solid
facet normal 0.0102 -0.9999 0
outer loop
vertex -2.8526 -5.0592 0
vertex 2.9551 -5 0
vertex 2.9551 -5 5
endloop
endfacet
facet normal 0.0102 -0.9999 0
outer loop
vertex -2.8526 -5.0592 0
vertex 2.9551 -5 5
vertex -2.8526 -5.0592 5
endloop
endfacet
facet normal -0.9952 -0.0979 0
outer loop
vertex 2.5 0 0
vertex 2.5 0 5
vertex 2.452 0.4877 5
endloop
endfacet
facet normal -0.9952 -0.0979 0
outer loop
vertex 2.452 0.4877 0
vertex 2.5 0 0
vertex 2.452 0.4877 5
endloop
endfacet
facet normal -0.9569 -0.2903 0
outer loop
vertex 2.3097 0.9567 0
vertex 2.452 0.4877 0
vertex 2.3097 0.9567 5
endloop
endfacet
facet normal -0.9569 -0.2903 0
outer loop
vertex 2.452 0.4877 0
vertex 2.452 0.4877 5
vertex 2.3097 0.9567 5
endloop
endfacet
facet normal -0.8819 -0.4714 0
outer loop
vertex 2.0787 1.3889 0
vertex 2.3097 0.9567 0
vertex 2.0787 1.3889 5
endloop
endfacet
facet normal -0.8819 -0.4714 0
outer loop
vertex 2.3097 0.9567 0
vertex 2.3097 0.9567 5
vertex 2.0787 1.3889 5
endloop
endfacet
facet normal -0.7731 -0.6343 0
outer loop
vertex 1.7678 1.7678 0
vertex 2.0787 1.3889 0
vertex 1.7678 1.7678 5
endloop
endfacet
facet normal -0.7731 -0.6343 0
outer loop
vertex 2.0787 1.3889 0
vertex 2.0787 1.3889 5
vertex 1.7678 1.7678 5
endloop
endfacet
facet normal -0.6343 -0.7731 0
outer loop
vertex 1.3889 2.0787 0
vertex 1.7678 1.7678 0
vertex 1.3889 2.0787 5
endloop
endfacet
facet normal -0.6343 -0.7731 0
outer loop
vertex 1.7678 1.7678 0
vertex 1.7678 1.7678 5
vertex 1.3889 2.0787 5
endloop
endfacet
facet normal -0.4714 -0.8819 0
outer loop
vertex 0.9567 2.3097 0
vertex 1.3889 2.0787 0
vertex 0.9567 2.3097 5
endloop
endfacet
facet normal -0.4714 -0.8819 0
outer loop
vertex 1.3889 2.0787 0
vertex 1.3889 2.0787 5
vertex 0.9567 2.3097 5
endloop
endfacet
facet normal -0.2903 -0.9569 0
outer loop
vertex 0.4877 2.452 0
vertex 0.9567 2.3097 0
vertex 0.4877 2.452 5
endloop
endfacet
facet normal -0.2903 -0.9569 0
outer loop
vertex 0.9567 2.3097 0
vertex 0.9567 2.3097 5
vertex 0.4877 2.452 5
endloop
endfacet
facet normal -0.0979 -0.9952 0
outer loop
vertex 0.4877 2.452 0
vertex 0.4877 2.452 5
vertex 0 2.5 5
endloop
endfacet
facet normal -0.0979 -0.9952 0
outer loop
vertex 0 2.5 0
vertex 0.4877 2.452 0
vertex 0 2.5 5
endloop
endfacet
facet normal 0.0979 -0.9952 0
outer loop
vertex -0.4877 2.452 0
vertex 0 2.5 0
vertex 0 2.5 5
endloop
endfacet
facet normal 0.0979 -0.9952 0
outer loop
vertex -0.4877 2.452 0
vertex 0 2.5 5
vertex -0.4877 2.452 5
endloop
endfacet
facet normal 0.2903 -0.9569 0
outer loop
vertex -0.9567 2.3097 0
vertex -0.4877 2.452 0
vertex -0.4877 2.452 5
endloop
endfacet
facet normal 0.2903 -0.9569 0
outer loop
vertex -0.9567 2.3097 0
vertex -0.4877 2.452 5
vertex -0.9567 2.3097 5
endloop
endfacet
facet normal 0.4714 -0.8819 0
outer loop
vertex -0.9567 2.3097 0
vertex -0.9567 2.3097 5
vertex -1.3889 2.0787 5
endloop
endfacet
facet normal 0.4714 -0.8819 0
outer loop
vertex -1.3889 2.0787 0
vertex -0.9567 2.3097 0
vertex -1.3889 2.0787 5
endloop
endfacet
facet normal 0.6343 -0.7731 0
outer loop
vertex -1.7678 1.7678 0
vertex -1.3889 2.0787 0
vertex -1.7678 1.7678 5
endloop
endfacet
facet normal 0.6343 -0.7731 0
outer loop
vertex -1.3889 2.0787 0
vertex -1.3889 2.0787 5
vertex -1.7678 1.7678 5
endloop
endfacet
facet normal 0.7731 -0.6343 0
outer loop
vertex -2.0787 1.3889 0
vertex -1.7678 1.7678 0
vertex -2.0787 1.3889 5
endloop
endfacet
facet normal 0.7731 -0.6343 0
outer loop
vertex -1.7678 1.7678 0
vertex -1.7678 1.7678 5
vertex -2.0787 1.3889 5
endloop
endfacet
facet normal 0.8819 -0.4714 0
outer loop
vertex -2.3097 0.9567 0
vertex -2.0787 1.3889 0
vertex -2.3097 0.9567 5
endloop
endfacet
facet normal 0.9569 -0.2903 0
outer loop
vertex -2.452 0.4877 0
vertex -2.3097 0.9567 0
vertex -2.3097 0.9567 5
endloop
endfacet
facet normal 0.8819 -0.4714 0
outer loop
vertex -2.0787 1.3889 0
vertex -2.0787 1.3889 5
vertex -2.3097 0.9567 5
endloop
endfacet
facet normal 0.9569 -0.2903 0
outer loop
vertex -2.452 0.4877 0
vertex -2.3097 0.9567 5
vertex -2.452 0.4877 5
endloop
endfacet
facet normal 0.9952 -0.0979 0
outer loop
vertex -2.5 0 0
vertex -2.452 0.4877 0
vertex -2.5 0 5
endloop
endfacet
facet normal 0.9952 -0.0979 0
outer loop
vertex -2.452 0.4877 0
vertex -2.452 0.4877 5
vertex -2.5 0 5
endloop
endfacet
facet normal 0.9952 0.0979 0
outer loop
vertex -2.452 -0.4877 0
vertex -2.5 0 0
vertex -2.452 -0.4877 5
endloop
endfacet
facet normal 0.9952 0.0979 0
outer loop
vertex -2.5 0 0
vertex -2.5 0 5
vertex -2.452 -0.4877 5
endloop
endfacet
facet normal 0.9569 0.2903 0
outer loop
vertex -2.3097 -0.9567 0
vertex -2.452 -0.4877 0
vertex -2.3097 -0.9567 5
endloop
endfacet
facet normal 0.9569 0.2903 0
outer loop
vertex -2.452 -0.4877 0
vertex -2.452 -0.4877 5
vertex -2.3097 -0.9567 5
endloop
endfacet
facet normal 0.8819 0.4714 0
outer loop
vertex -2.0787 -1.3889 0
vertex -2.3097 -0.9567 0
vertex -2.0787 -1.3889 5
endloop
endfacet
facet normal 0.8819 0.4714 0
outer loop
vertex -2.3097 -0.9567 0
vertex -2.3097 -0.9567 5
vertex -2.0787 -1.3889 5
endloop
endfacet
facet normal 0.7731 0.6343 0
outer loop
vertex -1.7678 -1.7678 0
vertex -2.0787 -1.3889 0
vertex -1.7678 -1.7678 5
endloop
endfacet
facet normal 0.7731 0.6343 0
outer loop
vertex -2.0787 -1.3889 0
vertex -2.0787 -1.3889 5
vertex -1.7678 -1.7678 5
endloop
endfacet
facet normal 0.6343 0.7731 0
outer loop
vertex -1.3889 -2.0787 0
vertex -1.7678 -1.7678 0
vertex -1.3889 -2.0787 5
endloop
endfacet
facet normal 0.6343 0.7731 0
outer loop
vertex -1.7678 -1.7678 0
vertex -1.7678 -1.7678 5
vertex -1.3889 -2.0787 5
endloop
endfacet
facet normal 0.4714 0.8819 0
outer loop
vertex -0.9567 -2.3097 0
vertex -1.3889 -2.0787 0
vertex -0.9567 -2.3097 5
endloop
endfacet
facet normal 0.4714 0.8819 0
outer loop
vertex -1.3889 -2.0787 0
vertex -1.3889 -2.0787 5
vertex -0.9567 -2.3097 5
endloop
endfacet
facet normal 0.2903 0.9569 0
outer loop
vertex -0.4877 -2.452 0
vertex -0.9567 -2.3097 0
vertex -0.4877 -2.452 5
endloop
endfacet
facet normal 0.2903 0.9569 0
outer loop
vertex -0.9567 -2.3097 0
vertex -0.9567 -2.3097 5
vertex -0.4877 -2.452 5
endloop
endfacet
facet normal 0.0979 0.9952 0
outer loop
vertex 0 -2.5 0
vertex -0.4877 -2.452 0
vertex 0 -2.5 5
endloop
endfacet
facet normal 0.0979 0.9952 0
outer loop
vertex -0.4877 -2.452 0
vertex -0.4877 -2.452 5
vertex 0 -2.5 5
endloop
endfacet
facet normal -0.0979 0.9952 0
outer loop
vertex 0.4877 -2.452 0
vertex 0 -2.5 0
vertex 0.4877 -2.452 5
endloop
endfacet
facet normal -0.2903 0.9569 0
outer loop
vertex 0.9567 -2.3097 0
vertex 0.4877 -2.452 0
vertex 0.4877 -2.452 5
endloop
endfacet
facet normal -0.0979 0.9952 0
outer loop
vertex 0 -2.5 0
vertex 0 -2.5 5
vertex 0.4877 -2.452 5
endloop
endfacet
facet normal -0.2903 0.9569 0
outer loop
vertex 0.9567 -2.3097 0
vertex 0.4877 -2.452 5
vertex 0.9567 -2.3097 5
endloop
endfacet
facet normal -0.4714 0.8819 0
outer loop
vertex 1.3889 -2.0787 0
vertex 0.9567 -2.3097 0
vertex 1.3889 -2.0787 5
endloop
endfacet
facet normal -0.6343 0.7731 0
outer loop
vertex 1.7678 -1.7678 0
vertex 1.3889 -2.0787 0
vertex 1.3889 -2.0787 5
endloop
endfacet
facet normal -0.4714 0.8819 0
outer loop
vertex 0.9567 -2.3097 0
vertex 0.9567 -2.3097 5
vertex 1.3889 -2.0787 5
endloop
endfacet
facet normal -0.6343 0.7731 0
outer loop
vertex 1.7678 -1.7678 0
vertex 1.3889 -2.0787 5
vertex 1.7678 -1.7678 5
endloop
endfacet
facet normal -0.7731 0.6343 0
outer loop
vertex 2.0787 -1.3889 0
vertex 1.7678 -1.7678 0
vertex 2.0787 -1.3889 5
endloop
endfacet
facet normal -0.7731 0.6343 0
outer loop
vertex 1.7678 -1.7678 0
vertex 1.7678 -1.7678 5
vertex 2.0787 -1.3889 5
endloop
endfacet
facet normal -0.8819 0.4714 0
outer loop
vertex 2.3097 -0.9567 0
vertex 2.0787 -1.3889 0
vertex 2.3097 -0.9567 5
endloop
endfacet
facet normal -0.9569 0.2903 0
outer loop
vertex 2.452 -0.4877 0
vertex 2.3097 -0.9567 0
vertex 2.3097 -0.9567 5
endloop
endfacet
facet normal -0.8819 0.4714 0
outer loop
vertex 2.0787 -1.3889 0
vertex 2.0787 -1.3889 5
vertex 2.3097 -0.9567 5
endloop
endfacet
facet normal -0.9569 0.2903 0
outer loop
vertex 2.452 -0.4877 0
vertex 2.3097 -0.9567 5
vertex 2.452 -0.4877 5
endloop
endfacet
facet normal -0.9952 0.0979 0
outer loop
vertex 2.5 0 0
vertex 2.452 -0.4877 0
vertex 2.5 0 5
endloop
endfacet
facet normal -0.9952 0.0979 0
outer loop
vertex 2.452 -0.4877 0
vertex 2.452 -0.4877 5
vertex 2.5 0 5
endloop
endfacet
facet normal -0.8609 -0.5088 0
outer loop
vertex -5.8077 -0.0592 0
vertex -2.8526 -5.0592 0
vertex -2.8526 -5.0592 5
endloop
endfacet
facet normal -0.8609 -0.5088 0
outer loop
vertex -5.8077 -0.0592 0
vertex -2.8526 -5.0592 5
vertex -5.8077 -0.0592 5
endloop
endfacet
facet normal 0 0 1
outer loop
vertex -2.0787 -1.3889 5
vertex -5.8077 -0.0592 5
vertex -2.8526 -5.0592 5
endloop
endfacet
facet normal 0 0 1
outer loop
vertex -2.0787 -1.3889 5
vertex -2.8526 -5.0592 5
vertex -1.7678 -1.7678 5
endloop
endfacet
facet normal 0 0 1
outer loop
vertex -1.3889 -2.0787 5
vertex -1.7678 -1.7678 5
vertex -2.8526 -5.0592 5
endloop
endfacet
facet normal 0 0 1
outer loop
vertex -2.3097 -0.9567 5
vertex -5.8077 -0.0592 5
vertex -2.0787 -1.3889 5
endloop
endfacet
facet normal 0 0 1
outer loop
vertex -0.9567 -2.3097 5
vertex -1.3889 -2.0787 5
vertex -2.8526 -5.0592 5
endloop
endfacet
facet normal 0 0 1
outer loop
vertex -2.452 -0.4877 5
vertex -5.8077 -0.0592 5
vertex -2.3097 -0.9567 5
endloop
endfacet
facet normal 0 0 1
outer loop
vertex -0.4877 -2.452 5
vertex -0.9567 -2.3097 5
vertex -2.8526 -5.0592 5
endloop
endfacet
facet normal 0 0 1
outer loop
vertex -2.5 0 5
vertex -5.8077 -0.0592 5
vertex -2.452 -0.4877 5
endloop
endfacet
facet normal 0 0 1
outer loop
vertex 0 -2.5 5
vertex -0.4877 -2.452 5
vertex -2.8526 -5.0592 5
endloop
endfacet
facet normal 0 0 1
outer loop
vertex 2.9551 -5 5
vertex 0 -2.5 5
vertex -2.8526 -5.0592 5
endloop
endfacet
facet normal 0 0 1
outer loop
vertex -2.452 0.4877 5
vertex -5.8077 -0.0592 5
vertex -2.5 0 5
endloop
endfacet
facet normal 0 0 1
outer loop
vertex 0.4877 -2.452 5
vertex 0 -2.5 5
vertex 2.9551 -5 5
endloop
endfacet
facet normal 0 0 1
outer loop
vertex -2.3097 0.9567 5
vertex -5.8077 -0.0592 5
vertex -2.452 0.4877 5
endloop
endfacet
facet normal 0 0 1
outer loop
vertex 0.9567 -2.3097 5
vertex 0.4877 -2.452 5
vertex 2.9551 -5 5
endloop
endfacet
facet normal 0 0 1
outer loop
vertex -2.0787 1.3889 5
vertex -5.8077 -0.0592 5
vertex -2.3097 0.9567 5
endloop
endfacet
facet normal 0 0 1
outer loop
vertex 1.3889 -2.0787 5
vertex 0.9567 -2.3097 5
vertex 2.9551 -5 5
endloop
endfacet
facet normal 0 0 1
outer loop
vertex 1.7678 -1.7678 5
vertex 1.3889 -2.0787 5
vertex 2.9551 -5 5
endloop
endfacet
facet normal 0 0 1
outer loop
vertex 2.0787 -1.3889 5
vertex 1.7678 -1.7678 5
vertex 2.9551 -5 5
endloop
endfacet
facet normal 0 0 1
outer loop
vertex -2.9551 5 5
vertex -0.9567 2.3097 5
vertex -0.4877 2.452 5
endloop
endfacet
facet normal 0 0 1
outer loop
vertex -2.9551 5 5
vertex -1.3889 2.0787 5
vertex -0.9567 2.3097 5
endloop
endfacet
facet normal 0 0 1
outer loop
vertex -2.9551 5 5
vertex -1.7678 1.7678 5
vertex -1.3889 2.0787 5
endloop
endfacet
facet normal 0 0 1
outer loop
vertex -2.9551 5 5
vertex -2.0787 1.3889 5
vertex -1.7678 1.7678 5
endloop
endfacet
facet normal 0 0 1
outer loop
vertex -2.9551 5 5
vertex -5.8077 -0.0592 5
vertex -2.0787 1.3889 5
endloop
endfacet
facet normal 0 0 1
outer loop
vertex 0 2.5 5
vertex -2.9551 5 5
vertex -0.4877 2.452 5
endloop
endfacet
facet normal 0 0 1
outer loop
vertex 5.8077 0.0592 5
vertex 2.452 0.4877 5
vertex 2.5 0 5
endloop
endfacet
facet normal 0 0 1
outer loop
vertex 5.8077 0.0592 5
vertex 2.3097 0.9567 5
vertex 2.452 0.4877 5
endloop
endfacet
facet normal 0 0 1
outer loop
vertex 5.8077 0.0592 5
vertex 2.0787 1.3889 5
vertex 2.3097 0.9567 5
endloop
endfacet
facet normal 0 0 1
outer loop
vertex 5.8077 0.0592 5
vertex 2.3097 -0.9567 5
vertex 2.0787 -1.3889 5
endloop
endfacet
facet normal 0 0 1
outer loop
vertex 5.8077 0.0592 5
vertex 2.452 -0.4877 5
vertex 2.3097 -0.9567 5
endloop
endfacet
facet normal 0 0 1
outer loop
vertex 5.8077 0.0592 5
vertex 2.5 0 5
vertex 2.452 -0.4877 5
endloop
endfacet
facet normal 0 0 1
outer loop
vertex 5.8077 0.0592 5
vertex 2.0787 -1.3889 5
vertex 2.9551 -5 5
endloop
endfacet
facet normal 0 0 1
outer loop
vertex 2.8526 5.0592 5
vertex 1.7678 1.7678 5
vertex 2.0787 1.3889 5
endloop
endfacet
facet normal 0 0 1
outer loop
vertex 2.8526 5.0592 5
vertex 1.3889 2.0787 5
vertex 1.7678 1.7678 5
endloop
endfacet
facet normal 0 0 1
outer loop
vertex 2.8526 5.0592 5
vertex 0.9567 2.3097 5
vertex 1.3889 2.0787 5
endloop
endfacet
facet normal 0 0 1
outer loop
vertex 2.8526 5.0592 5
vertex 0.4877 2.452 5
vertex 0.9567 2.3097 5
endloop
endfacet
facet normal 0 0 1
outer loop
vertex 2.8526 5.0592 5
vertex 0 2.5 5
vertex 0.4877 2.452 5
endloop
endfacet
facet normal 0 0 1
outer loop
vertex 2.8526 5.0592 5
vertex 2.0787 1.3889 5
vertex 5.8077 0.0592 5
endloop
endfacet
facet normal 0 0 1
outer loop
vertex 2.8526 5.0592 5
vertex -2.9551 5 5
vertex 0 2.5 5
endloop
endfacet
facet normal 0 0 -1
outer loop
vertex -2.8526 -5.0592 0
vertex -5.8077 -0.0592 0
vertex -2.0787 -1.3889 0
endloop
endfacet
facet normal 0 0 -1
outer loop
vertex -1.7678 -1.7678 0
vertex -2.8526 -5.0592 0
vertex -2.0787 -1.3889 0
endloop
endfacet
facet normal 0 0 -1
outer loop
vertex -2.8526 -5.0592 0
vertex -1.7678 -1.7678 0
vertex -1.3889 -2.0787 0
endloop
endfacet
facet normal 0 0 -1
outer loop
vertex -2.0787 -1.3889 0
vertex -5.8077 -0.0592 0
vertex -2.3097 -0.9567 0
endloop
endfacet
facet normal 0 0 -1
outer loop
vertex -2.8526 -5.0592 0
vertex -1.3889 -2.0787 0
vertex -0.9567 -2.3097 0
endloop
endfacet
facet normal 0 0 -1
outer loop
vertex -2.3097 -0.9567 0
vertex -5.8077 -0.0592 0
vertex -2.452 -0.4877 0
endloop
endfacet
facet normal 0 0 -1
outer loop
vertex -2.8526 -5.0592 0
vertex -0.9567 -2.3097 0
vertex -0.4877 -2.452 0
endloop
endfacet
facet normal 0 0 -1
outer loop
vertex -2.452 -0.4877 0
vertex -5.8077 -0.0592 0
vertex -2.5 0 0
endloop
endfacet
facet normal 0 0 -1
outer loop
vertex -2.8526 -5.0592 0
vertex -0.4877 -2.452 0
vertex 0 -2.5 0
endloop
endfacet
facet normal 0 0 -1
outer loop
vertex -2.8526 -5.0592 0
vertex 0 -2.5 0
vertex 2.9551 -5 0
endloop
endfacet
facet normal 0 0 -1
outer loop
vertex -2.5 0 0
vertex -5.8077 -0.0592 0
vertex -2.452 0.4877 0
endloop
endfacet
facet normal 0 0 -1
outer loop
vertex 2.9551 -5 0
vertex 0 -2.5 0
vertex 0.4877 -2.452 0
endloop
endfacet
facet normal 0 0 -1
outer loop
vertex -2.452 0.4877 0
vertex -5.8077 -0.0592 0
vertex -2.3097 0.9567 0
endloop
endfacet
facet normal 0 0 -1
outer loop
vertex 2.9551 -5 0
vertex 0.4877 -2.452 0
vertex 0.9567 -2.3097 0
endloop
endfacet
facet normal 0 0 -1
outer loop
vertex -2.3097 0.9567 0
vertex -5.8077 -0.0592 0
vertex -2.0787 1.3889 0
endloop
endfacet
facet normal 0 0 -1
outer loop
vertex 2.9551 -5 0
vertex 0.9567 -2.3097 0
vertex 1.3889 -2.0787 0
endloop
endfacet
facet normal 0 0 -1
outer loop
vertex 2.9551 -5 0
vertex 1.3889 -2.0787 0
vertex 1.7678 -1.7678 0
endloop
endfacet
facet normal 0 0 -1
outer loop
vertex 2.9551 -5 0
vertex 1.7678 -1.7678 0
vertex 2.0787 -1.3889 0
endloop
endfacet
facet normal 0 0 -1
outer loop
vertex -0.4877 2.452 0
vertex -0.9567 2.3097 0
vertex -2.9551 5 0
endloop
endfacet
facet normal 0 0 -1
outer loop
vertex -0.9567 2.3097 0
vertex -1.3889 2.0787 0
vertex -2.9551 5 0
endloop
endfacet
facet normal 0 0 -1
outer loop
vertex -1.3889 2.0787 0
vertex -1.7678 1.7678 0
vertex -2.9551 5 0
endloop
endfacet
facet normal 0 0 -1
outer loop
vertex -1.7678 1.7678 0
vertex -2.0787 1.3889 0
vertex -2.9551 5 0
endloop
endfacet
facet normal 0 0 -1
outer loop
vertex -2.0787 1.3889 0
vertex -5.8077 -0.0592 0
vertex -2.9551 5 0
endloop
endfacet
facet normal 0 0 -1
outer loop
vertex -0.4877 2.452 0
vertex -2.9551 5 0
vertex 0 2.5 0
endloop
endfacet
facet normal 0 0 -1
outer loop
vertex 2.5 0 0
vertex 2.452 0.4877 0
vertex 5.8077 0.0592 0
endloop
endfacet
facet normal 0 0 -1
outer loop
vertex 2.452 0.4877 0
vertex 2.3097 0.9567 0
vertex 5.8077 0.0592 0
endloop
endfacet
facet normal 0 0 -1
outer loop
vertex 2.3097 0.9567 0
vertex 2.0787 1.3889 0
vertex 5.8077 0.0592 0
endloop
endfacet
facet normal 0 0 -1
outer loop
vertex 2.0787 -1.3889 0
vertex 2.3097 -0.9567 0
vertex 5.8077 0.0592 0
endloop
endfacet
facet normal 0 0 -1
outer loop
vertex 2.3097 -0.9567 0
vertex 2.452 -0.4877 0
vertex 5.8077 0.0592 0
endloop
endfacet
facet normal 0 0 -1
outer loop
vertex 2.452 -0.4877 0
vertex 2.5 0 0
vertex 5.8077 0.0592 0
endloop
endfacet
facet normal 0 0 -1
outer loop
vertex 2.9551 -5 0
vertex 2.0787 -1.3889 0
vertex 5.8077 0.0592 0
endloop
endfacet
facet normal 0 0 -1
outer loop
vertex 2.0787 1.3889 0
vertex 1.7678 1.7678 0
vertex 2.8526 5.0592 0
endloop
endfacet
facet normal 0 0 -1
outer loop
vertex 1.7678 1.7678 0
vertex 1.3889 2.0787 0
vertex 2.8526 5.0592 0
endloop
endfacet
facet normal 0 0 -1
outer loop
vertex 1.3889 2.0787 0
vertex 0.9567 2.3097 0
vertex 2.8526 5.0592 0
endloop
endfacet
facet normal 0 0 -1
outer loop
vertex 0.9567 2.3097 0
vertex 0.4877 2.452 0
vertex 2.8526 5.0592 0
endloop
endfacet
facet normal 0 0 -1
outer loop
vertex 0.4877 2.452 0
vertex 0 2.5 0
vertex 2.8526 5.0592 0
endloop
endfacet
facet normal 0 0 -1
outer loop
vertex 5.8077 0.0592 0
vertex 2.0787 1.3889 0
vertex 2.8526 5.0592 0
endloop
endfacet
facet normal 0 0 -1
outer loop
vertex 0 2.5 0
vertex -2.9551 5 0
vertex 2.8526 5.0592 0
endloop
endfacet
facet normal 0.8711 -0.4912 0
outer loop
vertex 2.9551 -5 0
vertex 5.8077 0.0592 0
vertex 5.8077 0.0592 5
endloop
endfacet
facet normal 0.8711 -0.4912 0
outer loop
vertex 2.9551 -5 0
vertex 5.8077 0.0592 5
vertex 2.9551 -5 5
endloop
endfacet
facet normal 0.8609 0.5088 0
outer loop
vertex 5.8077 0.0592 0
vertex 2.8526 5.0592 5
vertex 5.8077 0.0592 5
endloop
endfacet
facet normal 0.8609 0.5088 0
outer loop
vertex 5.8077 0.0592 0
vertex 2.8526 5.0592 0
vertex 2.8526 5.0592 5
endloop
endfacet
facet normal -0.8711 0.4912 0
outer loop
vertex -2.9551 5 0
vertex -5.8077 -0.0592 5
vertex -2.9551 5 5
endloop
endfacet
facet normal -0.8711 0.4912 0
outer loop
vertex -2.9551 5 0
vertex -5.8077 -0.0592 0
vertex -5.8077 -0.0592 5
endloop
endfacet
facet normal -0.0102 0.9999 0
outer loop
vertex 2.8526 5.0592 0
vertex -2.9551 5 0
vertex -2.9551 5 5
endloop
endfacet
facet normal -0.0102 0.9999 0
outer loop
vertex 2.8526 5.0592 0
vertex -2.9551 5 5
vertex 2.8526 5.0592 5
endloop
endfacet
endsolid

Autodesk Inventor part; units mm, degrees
ref_plane "YZ Plane" through (0, 0, 0) normal (1, 0, 0) x (0, 1, 0)
ref_plane "XZ Plane" through (0, 0, 0) normal (0, 1, 0) x (-1, 0, 0)
ref_plane "XY Plane" through (0, 0, 0) normal (0, 0, 1) x (1, 0, 0)
sketch "Sketch1" plane through (0, 0, 0) normal (0, 0, 1) x (1, 0, 0)
  circle A0 centre (0, 0) radius 5
  line L0 (2.9551, -5) -> (-2.8526, -5.0592)
  line L1 (-2.8526, -5.0592) -> (-5.8077, -0.0592)
  line L2 (-5.8077, -0.0592) -> (-2.9551, 5)
  line L3 (-2.9551, 5) -> (2.8526, 5.0592)
  line L4 (2.8526, 5.0592) -> (5.8077, 0.0592)
  line L5 (5.8077, 0.0592) -> (2.9551, -5)
  dimension "d0" = 10
extrude "Extrusion1" add sketch "Sketch1" along normal blind 5 contours A0 | L0 L1 L2 L3 L4 L5
sketch "Sketch2" plane through (0, 0, 5) normal (0, 0, 1) x (1, 0, 0)
  circle A0 centre (0, 0) radius 2.5
  dimension "d3" = 5
extrude "Extrusion2" cut sketch "Sketch2" against normal blind 12.5
thread "Thread1" size "M5x0.8" class "6H" standard "ANSI Metric M Profile" full length
properties part number "Nut"
